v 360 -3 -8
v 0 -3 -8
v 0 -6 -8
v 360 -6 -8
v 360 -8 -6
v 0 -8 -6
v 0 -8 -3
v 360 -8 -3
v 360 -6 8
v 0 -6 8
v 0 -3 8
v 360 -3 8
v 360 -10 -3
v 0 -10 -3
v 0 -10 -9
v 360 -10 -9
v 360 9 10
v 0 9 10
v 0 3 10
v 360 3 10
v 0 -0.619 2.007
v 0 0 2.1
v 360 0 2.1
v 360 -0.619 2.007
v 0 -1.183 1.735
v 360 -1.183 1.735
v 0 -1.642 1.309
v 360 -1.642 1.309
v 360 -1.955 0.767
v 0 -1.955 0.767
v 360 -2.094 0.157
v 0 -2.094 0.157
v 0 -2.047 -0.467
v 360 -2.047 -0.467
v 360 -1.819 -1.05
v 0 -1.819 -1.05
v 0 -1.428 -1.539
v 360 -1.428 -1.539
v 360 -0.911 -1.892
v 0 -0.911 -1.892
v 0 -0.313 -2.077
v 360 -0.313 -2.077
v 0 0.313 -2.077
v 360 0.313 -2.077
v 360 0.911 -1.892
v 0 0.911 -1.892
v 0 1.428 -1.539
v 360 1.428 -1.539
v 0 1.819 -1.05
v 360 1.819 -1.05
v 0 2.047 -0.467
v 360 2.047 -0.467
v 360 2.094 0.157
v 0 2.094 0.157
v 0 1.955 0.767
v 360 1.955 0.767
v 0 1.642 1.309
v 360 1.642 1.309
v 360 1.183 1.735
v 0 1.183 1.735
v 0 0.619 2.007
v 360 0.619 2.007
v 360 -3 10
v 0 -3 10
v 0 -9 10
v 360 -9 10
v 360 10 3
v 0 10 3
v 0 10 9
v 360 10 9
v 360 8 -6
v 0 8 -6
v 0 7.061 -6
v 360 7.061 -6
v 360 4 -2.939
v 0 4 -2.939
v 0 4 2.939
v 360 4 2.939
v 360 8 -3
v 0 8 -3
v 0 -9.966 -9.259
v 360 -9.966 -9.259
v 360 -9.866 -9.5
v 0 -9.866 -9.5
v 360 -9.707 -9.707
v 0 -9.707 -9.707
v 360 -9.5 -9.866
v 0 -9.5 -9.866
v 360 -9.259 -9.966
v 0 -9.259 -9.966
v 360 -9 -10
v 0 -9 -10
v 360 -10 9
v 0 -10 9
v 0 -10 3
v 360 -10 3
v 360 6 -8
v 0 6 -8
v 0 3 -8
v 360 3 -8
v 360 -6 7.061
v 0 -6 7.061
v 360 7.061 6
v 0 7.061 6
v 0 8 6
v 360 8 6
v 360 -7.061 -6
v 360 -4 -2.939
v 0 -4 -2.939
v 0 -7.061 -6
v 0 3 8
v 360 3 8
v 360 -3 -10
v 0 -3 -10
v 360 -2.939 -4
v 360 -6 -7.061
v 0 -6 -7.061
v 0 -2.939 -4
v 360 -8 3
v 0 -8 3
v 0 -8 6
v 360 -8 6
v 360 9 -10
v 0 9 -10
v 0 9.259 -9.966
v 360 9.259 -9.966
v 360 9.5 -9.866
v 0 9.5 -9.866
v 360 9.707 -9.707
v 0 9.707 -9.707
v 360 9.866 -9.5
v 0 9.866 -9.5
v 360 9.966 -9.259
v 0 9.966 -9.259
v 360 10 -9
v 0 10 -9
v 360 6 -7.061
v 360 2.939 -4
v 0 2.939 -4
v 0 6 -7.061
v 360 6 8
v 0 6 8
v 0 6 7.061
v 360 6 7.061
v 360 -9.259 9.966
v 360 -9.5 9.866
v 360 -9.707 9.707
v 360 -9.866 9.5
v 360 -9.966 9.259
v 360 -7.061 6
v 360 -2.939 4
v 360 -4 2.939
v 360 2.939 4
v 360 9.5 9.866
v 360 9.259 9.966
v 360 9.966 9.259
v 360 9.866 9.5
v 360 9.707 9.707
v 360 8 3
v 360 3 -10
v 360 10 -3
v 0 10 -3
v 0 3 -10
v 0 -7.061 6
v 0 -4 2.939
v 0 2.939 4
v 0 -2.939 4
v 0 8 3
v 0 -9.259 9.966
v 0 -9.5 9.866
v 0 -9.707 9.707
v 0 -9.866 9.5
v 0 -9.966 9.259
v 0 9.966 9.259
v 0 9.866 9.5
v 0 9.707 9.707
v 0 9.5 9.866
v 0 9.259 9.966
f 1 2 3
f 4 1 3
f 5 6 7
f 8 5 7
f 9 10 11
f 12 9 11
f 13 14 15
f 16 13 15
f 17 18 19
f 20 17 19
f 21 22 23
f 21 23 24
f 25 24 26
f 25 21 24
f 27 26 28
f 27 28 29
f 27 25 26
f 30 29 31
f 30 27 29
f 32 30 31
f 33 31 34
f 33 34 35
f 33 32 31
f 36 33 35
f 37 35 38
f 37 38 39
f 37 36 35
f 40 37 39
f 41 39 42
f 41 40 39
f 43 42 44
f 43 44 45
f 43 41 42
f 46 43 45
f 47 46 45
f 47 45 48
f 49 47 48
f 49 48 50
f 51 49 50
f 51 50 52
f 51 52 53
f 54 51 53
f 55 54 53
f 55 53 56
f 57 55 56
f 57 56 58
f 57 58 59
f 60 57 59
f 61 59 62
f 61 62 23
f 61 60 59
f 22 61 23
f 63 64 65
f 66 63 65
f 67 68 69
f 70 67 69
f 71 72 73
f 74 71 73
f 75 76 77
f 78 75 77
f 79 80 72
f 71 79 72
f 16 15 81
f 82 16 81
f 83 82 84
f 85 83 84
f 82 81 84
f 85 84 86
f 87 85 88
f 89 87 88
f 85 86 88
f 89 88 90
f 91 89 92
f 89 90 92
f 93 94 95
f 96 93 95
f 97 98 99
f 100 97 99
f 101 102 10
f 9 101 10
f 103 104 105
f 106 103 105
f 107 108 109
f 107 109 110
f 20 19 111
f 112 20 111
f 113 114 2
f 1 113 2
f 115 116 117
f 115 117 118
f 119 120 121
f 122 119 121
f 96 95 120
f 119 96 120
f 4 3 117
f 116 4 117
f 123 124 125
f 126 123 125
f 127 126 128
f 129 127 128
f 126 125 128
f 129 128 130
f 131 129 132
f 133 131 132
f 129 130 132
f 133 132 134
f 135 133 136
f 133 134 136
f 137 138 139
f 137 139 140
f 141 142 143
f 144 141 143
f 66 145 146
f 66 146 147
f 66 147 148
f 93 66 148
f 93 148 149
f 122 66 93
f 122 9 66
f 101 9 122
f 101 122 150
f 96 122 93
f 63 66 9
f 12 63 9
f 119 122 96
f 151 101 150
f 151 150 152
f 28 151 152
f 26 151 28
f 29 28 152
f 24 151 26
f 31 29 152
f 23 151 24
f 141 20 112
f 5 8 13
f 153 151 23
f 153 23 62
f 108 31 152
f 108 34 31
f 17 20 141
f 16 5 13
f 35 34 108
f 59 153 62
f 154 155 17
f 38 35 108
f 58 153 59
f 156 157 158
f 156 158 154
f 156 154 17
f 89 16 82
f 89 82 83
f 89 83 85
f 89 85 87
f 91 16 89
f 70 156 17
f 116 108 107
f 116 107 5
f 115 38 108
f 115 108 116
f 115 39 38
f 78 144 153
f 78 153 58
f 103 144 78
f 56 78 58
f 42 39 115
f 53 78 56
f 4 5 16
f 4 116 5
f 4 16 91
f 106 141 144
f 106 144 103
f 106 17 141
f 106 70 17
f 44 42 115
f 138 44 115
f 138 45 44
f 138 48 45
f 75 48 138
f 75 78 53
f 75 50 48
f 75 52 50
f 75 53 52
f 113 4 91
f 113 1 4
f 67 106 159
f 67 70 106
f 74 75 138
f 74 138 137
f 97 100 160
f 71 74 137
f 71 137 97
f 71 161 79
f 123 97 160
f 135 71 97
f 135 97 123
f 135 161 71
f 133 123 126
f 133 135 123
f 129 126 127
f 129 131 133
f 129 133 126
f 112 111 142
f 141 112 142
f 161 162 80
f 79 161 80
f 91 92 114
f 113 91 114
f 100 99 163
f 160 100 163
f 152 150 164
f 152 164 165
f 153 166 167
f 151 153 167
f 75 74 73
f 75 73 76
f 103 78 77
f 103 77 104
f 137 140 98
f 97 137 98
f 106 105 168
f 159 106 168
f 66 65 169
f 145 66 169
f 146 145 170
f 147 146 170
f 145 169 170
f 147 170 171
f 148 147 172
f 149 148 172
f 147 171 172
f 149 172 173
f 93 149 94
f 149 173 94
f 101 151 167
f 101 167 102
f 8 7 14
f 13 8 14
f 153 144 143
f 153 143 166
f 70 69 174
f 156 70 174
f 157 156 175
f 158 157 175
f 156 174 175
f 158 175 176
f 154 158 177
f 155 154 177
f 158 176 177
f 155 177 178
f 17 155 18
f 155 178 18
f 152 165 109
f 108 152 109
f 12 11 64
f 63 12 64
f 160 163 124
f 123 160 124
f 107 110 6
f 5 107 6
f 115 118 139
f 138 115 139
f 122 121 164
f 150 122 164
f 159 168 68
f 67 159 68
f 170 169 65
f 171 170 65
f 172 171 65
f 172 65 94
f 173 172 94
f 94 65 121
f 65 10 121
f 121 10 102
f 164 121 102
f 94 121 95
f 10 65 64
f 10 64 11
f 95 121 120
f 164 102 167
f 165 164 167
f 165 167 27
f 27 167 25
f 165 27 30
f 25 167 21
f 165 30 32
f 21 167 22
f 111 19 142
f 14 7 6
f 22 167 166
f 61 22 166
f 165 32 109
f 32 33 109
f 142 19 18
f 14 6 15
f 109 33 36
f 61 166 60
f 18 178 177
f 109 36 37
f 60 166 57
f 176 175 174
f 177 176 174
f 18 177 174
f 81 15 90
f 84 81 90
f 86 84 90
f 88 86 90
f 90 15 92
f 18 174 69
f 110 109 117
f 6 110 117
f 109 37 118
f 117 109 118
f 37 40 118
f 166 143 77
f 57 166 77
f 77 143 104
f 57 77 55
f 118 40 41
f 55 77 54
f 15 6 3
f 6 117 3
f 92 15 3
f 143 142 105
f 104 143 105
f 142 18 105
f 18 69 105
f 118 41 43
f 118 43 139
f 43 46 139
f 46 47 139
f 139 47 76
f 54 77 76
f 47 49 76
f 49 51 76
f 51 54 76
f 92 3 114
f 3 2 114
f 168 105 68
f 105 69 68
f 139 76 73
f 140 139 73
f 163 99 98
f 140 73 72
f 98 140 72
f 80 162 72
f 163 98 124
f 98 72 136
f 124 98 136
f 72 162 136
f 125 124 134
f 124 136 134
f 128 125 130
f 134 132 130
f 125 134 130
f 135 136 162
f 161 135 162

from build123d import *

# Parameters (mm, degrees)
SKETCH1_R           = 2.1
BOSS_EXTRUDE1_DEPTH = 360


with BuildPart() as part:
    # Sketch1 → Boss-Extrude1 (new body)
    with BuildSketch(Plane(origin=(0, 0, 0), x_dir=(0, 0, -1), z_dir=(1, 0, 0))):
        with BuildLine():
            Line((-10, 9), (-10, 3))
            Line((-10, 3), (-8, 3))
            Line((-8, 3), (-8, 6))
            Line((-8, 6), (-7.060660172, 6))
            Line((-7.060660172, 6), (-4, 2.939339828))
            Line((-4, 2.939339828), (-4, -2.939339828))
            Line((-4, -2.939339828), (-7.060660172, -6))
            Line((-7.060660172, -6), (-8, -6))
            Line((-8, -6), (-8, -3))
            Line((-8, -3), (-10, -3))
            Line((-10, -3), (-10, -9))
            ThreePointArc((-10, -9), (-9.707106781, -9.707106781), (-9, -10))
            Line((-9, -10), (-3, -10))
            Line((-3, -10), (-3, -8))
            Line((-3, -8), (-6, -8))
            Line((-6, -8), (-6, -7.060660172))
            Line((-6, -7.060660172), (-2.939339828, -4))
            Line((-2.939339828, -4), (2.939339828, -4))
            Line((2.939339828, -4), (6, -7.060660172))
            Line((6, -7.060660172), (6, -8))
            Line((6, -8), (3, -8))
            Line((3, -8), (3, -10))
            Line((3, -10), (9, -10))
            ThreePointArc((9, -10), (9.707106781, -9.707106781), (10, -9))
            Line((10, -9), (10, -3))
            Line((10, -3), (8, -3))
            Line((8, -3), (8, -6))
            Line((8, -6), (7.060660172, -6))
            Line((7.060660172, -6), (4, -2.939339828))
            Line((4, -2.939339828), (4, 2.939339828))
            Line((4, 2.939339828), (7.060660172, 6))
            Line((7.060660172, 6), (8, 6))
            Line((8, 6), (8, 3))
            Line((8, 3), (10, 3))
            Line((10, 3), (10, 9))
            ThreePointArc((10, 9), (9.707106781, 9.707106781), (9, 10))
            Line((9, 10), (3, 10))
            Line((3, 10), (3, 8))
            Line((3, 8), (6, 8))
            Line((6, 8), (6, 7.060660172))
            Line((6, 7.060660172), (2.939339828, 4))
            Line((2.939339828, 4), (-2.939339828, 4))
            Line((-2.939339828, 4), (-6, 7.060660172))
            Line((-6, 7.060660172), (-6, 8))
            Line((-6, 8), (-3, 8))
            Line((-3, 8), (-3, 10))
            Line((-3, 10), (-9, 10))
            ThreePointArc((-9, 10), (-9.707106781, 9.707106781), (-10, 9))
        make_face()
        Circle(SKETCH1_R, mode=Mode.SUBTRACT)
    extrude(amount=BOSS_EXTRUDE1_DEPTH)


solid = part.part
